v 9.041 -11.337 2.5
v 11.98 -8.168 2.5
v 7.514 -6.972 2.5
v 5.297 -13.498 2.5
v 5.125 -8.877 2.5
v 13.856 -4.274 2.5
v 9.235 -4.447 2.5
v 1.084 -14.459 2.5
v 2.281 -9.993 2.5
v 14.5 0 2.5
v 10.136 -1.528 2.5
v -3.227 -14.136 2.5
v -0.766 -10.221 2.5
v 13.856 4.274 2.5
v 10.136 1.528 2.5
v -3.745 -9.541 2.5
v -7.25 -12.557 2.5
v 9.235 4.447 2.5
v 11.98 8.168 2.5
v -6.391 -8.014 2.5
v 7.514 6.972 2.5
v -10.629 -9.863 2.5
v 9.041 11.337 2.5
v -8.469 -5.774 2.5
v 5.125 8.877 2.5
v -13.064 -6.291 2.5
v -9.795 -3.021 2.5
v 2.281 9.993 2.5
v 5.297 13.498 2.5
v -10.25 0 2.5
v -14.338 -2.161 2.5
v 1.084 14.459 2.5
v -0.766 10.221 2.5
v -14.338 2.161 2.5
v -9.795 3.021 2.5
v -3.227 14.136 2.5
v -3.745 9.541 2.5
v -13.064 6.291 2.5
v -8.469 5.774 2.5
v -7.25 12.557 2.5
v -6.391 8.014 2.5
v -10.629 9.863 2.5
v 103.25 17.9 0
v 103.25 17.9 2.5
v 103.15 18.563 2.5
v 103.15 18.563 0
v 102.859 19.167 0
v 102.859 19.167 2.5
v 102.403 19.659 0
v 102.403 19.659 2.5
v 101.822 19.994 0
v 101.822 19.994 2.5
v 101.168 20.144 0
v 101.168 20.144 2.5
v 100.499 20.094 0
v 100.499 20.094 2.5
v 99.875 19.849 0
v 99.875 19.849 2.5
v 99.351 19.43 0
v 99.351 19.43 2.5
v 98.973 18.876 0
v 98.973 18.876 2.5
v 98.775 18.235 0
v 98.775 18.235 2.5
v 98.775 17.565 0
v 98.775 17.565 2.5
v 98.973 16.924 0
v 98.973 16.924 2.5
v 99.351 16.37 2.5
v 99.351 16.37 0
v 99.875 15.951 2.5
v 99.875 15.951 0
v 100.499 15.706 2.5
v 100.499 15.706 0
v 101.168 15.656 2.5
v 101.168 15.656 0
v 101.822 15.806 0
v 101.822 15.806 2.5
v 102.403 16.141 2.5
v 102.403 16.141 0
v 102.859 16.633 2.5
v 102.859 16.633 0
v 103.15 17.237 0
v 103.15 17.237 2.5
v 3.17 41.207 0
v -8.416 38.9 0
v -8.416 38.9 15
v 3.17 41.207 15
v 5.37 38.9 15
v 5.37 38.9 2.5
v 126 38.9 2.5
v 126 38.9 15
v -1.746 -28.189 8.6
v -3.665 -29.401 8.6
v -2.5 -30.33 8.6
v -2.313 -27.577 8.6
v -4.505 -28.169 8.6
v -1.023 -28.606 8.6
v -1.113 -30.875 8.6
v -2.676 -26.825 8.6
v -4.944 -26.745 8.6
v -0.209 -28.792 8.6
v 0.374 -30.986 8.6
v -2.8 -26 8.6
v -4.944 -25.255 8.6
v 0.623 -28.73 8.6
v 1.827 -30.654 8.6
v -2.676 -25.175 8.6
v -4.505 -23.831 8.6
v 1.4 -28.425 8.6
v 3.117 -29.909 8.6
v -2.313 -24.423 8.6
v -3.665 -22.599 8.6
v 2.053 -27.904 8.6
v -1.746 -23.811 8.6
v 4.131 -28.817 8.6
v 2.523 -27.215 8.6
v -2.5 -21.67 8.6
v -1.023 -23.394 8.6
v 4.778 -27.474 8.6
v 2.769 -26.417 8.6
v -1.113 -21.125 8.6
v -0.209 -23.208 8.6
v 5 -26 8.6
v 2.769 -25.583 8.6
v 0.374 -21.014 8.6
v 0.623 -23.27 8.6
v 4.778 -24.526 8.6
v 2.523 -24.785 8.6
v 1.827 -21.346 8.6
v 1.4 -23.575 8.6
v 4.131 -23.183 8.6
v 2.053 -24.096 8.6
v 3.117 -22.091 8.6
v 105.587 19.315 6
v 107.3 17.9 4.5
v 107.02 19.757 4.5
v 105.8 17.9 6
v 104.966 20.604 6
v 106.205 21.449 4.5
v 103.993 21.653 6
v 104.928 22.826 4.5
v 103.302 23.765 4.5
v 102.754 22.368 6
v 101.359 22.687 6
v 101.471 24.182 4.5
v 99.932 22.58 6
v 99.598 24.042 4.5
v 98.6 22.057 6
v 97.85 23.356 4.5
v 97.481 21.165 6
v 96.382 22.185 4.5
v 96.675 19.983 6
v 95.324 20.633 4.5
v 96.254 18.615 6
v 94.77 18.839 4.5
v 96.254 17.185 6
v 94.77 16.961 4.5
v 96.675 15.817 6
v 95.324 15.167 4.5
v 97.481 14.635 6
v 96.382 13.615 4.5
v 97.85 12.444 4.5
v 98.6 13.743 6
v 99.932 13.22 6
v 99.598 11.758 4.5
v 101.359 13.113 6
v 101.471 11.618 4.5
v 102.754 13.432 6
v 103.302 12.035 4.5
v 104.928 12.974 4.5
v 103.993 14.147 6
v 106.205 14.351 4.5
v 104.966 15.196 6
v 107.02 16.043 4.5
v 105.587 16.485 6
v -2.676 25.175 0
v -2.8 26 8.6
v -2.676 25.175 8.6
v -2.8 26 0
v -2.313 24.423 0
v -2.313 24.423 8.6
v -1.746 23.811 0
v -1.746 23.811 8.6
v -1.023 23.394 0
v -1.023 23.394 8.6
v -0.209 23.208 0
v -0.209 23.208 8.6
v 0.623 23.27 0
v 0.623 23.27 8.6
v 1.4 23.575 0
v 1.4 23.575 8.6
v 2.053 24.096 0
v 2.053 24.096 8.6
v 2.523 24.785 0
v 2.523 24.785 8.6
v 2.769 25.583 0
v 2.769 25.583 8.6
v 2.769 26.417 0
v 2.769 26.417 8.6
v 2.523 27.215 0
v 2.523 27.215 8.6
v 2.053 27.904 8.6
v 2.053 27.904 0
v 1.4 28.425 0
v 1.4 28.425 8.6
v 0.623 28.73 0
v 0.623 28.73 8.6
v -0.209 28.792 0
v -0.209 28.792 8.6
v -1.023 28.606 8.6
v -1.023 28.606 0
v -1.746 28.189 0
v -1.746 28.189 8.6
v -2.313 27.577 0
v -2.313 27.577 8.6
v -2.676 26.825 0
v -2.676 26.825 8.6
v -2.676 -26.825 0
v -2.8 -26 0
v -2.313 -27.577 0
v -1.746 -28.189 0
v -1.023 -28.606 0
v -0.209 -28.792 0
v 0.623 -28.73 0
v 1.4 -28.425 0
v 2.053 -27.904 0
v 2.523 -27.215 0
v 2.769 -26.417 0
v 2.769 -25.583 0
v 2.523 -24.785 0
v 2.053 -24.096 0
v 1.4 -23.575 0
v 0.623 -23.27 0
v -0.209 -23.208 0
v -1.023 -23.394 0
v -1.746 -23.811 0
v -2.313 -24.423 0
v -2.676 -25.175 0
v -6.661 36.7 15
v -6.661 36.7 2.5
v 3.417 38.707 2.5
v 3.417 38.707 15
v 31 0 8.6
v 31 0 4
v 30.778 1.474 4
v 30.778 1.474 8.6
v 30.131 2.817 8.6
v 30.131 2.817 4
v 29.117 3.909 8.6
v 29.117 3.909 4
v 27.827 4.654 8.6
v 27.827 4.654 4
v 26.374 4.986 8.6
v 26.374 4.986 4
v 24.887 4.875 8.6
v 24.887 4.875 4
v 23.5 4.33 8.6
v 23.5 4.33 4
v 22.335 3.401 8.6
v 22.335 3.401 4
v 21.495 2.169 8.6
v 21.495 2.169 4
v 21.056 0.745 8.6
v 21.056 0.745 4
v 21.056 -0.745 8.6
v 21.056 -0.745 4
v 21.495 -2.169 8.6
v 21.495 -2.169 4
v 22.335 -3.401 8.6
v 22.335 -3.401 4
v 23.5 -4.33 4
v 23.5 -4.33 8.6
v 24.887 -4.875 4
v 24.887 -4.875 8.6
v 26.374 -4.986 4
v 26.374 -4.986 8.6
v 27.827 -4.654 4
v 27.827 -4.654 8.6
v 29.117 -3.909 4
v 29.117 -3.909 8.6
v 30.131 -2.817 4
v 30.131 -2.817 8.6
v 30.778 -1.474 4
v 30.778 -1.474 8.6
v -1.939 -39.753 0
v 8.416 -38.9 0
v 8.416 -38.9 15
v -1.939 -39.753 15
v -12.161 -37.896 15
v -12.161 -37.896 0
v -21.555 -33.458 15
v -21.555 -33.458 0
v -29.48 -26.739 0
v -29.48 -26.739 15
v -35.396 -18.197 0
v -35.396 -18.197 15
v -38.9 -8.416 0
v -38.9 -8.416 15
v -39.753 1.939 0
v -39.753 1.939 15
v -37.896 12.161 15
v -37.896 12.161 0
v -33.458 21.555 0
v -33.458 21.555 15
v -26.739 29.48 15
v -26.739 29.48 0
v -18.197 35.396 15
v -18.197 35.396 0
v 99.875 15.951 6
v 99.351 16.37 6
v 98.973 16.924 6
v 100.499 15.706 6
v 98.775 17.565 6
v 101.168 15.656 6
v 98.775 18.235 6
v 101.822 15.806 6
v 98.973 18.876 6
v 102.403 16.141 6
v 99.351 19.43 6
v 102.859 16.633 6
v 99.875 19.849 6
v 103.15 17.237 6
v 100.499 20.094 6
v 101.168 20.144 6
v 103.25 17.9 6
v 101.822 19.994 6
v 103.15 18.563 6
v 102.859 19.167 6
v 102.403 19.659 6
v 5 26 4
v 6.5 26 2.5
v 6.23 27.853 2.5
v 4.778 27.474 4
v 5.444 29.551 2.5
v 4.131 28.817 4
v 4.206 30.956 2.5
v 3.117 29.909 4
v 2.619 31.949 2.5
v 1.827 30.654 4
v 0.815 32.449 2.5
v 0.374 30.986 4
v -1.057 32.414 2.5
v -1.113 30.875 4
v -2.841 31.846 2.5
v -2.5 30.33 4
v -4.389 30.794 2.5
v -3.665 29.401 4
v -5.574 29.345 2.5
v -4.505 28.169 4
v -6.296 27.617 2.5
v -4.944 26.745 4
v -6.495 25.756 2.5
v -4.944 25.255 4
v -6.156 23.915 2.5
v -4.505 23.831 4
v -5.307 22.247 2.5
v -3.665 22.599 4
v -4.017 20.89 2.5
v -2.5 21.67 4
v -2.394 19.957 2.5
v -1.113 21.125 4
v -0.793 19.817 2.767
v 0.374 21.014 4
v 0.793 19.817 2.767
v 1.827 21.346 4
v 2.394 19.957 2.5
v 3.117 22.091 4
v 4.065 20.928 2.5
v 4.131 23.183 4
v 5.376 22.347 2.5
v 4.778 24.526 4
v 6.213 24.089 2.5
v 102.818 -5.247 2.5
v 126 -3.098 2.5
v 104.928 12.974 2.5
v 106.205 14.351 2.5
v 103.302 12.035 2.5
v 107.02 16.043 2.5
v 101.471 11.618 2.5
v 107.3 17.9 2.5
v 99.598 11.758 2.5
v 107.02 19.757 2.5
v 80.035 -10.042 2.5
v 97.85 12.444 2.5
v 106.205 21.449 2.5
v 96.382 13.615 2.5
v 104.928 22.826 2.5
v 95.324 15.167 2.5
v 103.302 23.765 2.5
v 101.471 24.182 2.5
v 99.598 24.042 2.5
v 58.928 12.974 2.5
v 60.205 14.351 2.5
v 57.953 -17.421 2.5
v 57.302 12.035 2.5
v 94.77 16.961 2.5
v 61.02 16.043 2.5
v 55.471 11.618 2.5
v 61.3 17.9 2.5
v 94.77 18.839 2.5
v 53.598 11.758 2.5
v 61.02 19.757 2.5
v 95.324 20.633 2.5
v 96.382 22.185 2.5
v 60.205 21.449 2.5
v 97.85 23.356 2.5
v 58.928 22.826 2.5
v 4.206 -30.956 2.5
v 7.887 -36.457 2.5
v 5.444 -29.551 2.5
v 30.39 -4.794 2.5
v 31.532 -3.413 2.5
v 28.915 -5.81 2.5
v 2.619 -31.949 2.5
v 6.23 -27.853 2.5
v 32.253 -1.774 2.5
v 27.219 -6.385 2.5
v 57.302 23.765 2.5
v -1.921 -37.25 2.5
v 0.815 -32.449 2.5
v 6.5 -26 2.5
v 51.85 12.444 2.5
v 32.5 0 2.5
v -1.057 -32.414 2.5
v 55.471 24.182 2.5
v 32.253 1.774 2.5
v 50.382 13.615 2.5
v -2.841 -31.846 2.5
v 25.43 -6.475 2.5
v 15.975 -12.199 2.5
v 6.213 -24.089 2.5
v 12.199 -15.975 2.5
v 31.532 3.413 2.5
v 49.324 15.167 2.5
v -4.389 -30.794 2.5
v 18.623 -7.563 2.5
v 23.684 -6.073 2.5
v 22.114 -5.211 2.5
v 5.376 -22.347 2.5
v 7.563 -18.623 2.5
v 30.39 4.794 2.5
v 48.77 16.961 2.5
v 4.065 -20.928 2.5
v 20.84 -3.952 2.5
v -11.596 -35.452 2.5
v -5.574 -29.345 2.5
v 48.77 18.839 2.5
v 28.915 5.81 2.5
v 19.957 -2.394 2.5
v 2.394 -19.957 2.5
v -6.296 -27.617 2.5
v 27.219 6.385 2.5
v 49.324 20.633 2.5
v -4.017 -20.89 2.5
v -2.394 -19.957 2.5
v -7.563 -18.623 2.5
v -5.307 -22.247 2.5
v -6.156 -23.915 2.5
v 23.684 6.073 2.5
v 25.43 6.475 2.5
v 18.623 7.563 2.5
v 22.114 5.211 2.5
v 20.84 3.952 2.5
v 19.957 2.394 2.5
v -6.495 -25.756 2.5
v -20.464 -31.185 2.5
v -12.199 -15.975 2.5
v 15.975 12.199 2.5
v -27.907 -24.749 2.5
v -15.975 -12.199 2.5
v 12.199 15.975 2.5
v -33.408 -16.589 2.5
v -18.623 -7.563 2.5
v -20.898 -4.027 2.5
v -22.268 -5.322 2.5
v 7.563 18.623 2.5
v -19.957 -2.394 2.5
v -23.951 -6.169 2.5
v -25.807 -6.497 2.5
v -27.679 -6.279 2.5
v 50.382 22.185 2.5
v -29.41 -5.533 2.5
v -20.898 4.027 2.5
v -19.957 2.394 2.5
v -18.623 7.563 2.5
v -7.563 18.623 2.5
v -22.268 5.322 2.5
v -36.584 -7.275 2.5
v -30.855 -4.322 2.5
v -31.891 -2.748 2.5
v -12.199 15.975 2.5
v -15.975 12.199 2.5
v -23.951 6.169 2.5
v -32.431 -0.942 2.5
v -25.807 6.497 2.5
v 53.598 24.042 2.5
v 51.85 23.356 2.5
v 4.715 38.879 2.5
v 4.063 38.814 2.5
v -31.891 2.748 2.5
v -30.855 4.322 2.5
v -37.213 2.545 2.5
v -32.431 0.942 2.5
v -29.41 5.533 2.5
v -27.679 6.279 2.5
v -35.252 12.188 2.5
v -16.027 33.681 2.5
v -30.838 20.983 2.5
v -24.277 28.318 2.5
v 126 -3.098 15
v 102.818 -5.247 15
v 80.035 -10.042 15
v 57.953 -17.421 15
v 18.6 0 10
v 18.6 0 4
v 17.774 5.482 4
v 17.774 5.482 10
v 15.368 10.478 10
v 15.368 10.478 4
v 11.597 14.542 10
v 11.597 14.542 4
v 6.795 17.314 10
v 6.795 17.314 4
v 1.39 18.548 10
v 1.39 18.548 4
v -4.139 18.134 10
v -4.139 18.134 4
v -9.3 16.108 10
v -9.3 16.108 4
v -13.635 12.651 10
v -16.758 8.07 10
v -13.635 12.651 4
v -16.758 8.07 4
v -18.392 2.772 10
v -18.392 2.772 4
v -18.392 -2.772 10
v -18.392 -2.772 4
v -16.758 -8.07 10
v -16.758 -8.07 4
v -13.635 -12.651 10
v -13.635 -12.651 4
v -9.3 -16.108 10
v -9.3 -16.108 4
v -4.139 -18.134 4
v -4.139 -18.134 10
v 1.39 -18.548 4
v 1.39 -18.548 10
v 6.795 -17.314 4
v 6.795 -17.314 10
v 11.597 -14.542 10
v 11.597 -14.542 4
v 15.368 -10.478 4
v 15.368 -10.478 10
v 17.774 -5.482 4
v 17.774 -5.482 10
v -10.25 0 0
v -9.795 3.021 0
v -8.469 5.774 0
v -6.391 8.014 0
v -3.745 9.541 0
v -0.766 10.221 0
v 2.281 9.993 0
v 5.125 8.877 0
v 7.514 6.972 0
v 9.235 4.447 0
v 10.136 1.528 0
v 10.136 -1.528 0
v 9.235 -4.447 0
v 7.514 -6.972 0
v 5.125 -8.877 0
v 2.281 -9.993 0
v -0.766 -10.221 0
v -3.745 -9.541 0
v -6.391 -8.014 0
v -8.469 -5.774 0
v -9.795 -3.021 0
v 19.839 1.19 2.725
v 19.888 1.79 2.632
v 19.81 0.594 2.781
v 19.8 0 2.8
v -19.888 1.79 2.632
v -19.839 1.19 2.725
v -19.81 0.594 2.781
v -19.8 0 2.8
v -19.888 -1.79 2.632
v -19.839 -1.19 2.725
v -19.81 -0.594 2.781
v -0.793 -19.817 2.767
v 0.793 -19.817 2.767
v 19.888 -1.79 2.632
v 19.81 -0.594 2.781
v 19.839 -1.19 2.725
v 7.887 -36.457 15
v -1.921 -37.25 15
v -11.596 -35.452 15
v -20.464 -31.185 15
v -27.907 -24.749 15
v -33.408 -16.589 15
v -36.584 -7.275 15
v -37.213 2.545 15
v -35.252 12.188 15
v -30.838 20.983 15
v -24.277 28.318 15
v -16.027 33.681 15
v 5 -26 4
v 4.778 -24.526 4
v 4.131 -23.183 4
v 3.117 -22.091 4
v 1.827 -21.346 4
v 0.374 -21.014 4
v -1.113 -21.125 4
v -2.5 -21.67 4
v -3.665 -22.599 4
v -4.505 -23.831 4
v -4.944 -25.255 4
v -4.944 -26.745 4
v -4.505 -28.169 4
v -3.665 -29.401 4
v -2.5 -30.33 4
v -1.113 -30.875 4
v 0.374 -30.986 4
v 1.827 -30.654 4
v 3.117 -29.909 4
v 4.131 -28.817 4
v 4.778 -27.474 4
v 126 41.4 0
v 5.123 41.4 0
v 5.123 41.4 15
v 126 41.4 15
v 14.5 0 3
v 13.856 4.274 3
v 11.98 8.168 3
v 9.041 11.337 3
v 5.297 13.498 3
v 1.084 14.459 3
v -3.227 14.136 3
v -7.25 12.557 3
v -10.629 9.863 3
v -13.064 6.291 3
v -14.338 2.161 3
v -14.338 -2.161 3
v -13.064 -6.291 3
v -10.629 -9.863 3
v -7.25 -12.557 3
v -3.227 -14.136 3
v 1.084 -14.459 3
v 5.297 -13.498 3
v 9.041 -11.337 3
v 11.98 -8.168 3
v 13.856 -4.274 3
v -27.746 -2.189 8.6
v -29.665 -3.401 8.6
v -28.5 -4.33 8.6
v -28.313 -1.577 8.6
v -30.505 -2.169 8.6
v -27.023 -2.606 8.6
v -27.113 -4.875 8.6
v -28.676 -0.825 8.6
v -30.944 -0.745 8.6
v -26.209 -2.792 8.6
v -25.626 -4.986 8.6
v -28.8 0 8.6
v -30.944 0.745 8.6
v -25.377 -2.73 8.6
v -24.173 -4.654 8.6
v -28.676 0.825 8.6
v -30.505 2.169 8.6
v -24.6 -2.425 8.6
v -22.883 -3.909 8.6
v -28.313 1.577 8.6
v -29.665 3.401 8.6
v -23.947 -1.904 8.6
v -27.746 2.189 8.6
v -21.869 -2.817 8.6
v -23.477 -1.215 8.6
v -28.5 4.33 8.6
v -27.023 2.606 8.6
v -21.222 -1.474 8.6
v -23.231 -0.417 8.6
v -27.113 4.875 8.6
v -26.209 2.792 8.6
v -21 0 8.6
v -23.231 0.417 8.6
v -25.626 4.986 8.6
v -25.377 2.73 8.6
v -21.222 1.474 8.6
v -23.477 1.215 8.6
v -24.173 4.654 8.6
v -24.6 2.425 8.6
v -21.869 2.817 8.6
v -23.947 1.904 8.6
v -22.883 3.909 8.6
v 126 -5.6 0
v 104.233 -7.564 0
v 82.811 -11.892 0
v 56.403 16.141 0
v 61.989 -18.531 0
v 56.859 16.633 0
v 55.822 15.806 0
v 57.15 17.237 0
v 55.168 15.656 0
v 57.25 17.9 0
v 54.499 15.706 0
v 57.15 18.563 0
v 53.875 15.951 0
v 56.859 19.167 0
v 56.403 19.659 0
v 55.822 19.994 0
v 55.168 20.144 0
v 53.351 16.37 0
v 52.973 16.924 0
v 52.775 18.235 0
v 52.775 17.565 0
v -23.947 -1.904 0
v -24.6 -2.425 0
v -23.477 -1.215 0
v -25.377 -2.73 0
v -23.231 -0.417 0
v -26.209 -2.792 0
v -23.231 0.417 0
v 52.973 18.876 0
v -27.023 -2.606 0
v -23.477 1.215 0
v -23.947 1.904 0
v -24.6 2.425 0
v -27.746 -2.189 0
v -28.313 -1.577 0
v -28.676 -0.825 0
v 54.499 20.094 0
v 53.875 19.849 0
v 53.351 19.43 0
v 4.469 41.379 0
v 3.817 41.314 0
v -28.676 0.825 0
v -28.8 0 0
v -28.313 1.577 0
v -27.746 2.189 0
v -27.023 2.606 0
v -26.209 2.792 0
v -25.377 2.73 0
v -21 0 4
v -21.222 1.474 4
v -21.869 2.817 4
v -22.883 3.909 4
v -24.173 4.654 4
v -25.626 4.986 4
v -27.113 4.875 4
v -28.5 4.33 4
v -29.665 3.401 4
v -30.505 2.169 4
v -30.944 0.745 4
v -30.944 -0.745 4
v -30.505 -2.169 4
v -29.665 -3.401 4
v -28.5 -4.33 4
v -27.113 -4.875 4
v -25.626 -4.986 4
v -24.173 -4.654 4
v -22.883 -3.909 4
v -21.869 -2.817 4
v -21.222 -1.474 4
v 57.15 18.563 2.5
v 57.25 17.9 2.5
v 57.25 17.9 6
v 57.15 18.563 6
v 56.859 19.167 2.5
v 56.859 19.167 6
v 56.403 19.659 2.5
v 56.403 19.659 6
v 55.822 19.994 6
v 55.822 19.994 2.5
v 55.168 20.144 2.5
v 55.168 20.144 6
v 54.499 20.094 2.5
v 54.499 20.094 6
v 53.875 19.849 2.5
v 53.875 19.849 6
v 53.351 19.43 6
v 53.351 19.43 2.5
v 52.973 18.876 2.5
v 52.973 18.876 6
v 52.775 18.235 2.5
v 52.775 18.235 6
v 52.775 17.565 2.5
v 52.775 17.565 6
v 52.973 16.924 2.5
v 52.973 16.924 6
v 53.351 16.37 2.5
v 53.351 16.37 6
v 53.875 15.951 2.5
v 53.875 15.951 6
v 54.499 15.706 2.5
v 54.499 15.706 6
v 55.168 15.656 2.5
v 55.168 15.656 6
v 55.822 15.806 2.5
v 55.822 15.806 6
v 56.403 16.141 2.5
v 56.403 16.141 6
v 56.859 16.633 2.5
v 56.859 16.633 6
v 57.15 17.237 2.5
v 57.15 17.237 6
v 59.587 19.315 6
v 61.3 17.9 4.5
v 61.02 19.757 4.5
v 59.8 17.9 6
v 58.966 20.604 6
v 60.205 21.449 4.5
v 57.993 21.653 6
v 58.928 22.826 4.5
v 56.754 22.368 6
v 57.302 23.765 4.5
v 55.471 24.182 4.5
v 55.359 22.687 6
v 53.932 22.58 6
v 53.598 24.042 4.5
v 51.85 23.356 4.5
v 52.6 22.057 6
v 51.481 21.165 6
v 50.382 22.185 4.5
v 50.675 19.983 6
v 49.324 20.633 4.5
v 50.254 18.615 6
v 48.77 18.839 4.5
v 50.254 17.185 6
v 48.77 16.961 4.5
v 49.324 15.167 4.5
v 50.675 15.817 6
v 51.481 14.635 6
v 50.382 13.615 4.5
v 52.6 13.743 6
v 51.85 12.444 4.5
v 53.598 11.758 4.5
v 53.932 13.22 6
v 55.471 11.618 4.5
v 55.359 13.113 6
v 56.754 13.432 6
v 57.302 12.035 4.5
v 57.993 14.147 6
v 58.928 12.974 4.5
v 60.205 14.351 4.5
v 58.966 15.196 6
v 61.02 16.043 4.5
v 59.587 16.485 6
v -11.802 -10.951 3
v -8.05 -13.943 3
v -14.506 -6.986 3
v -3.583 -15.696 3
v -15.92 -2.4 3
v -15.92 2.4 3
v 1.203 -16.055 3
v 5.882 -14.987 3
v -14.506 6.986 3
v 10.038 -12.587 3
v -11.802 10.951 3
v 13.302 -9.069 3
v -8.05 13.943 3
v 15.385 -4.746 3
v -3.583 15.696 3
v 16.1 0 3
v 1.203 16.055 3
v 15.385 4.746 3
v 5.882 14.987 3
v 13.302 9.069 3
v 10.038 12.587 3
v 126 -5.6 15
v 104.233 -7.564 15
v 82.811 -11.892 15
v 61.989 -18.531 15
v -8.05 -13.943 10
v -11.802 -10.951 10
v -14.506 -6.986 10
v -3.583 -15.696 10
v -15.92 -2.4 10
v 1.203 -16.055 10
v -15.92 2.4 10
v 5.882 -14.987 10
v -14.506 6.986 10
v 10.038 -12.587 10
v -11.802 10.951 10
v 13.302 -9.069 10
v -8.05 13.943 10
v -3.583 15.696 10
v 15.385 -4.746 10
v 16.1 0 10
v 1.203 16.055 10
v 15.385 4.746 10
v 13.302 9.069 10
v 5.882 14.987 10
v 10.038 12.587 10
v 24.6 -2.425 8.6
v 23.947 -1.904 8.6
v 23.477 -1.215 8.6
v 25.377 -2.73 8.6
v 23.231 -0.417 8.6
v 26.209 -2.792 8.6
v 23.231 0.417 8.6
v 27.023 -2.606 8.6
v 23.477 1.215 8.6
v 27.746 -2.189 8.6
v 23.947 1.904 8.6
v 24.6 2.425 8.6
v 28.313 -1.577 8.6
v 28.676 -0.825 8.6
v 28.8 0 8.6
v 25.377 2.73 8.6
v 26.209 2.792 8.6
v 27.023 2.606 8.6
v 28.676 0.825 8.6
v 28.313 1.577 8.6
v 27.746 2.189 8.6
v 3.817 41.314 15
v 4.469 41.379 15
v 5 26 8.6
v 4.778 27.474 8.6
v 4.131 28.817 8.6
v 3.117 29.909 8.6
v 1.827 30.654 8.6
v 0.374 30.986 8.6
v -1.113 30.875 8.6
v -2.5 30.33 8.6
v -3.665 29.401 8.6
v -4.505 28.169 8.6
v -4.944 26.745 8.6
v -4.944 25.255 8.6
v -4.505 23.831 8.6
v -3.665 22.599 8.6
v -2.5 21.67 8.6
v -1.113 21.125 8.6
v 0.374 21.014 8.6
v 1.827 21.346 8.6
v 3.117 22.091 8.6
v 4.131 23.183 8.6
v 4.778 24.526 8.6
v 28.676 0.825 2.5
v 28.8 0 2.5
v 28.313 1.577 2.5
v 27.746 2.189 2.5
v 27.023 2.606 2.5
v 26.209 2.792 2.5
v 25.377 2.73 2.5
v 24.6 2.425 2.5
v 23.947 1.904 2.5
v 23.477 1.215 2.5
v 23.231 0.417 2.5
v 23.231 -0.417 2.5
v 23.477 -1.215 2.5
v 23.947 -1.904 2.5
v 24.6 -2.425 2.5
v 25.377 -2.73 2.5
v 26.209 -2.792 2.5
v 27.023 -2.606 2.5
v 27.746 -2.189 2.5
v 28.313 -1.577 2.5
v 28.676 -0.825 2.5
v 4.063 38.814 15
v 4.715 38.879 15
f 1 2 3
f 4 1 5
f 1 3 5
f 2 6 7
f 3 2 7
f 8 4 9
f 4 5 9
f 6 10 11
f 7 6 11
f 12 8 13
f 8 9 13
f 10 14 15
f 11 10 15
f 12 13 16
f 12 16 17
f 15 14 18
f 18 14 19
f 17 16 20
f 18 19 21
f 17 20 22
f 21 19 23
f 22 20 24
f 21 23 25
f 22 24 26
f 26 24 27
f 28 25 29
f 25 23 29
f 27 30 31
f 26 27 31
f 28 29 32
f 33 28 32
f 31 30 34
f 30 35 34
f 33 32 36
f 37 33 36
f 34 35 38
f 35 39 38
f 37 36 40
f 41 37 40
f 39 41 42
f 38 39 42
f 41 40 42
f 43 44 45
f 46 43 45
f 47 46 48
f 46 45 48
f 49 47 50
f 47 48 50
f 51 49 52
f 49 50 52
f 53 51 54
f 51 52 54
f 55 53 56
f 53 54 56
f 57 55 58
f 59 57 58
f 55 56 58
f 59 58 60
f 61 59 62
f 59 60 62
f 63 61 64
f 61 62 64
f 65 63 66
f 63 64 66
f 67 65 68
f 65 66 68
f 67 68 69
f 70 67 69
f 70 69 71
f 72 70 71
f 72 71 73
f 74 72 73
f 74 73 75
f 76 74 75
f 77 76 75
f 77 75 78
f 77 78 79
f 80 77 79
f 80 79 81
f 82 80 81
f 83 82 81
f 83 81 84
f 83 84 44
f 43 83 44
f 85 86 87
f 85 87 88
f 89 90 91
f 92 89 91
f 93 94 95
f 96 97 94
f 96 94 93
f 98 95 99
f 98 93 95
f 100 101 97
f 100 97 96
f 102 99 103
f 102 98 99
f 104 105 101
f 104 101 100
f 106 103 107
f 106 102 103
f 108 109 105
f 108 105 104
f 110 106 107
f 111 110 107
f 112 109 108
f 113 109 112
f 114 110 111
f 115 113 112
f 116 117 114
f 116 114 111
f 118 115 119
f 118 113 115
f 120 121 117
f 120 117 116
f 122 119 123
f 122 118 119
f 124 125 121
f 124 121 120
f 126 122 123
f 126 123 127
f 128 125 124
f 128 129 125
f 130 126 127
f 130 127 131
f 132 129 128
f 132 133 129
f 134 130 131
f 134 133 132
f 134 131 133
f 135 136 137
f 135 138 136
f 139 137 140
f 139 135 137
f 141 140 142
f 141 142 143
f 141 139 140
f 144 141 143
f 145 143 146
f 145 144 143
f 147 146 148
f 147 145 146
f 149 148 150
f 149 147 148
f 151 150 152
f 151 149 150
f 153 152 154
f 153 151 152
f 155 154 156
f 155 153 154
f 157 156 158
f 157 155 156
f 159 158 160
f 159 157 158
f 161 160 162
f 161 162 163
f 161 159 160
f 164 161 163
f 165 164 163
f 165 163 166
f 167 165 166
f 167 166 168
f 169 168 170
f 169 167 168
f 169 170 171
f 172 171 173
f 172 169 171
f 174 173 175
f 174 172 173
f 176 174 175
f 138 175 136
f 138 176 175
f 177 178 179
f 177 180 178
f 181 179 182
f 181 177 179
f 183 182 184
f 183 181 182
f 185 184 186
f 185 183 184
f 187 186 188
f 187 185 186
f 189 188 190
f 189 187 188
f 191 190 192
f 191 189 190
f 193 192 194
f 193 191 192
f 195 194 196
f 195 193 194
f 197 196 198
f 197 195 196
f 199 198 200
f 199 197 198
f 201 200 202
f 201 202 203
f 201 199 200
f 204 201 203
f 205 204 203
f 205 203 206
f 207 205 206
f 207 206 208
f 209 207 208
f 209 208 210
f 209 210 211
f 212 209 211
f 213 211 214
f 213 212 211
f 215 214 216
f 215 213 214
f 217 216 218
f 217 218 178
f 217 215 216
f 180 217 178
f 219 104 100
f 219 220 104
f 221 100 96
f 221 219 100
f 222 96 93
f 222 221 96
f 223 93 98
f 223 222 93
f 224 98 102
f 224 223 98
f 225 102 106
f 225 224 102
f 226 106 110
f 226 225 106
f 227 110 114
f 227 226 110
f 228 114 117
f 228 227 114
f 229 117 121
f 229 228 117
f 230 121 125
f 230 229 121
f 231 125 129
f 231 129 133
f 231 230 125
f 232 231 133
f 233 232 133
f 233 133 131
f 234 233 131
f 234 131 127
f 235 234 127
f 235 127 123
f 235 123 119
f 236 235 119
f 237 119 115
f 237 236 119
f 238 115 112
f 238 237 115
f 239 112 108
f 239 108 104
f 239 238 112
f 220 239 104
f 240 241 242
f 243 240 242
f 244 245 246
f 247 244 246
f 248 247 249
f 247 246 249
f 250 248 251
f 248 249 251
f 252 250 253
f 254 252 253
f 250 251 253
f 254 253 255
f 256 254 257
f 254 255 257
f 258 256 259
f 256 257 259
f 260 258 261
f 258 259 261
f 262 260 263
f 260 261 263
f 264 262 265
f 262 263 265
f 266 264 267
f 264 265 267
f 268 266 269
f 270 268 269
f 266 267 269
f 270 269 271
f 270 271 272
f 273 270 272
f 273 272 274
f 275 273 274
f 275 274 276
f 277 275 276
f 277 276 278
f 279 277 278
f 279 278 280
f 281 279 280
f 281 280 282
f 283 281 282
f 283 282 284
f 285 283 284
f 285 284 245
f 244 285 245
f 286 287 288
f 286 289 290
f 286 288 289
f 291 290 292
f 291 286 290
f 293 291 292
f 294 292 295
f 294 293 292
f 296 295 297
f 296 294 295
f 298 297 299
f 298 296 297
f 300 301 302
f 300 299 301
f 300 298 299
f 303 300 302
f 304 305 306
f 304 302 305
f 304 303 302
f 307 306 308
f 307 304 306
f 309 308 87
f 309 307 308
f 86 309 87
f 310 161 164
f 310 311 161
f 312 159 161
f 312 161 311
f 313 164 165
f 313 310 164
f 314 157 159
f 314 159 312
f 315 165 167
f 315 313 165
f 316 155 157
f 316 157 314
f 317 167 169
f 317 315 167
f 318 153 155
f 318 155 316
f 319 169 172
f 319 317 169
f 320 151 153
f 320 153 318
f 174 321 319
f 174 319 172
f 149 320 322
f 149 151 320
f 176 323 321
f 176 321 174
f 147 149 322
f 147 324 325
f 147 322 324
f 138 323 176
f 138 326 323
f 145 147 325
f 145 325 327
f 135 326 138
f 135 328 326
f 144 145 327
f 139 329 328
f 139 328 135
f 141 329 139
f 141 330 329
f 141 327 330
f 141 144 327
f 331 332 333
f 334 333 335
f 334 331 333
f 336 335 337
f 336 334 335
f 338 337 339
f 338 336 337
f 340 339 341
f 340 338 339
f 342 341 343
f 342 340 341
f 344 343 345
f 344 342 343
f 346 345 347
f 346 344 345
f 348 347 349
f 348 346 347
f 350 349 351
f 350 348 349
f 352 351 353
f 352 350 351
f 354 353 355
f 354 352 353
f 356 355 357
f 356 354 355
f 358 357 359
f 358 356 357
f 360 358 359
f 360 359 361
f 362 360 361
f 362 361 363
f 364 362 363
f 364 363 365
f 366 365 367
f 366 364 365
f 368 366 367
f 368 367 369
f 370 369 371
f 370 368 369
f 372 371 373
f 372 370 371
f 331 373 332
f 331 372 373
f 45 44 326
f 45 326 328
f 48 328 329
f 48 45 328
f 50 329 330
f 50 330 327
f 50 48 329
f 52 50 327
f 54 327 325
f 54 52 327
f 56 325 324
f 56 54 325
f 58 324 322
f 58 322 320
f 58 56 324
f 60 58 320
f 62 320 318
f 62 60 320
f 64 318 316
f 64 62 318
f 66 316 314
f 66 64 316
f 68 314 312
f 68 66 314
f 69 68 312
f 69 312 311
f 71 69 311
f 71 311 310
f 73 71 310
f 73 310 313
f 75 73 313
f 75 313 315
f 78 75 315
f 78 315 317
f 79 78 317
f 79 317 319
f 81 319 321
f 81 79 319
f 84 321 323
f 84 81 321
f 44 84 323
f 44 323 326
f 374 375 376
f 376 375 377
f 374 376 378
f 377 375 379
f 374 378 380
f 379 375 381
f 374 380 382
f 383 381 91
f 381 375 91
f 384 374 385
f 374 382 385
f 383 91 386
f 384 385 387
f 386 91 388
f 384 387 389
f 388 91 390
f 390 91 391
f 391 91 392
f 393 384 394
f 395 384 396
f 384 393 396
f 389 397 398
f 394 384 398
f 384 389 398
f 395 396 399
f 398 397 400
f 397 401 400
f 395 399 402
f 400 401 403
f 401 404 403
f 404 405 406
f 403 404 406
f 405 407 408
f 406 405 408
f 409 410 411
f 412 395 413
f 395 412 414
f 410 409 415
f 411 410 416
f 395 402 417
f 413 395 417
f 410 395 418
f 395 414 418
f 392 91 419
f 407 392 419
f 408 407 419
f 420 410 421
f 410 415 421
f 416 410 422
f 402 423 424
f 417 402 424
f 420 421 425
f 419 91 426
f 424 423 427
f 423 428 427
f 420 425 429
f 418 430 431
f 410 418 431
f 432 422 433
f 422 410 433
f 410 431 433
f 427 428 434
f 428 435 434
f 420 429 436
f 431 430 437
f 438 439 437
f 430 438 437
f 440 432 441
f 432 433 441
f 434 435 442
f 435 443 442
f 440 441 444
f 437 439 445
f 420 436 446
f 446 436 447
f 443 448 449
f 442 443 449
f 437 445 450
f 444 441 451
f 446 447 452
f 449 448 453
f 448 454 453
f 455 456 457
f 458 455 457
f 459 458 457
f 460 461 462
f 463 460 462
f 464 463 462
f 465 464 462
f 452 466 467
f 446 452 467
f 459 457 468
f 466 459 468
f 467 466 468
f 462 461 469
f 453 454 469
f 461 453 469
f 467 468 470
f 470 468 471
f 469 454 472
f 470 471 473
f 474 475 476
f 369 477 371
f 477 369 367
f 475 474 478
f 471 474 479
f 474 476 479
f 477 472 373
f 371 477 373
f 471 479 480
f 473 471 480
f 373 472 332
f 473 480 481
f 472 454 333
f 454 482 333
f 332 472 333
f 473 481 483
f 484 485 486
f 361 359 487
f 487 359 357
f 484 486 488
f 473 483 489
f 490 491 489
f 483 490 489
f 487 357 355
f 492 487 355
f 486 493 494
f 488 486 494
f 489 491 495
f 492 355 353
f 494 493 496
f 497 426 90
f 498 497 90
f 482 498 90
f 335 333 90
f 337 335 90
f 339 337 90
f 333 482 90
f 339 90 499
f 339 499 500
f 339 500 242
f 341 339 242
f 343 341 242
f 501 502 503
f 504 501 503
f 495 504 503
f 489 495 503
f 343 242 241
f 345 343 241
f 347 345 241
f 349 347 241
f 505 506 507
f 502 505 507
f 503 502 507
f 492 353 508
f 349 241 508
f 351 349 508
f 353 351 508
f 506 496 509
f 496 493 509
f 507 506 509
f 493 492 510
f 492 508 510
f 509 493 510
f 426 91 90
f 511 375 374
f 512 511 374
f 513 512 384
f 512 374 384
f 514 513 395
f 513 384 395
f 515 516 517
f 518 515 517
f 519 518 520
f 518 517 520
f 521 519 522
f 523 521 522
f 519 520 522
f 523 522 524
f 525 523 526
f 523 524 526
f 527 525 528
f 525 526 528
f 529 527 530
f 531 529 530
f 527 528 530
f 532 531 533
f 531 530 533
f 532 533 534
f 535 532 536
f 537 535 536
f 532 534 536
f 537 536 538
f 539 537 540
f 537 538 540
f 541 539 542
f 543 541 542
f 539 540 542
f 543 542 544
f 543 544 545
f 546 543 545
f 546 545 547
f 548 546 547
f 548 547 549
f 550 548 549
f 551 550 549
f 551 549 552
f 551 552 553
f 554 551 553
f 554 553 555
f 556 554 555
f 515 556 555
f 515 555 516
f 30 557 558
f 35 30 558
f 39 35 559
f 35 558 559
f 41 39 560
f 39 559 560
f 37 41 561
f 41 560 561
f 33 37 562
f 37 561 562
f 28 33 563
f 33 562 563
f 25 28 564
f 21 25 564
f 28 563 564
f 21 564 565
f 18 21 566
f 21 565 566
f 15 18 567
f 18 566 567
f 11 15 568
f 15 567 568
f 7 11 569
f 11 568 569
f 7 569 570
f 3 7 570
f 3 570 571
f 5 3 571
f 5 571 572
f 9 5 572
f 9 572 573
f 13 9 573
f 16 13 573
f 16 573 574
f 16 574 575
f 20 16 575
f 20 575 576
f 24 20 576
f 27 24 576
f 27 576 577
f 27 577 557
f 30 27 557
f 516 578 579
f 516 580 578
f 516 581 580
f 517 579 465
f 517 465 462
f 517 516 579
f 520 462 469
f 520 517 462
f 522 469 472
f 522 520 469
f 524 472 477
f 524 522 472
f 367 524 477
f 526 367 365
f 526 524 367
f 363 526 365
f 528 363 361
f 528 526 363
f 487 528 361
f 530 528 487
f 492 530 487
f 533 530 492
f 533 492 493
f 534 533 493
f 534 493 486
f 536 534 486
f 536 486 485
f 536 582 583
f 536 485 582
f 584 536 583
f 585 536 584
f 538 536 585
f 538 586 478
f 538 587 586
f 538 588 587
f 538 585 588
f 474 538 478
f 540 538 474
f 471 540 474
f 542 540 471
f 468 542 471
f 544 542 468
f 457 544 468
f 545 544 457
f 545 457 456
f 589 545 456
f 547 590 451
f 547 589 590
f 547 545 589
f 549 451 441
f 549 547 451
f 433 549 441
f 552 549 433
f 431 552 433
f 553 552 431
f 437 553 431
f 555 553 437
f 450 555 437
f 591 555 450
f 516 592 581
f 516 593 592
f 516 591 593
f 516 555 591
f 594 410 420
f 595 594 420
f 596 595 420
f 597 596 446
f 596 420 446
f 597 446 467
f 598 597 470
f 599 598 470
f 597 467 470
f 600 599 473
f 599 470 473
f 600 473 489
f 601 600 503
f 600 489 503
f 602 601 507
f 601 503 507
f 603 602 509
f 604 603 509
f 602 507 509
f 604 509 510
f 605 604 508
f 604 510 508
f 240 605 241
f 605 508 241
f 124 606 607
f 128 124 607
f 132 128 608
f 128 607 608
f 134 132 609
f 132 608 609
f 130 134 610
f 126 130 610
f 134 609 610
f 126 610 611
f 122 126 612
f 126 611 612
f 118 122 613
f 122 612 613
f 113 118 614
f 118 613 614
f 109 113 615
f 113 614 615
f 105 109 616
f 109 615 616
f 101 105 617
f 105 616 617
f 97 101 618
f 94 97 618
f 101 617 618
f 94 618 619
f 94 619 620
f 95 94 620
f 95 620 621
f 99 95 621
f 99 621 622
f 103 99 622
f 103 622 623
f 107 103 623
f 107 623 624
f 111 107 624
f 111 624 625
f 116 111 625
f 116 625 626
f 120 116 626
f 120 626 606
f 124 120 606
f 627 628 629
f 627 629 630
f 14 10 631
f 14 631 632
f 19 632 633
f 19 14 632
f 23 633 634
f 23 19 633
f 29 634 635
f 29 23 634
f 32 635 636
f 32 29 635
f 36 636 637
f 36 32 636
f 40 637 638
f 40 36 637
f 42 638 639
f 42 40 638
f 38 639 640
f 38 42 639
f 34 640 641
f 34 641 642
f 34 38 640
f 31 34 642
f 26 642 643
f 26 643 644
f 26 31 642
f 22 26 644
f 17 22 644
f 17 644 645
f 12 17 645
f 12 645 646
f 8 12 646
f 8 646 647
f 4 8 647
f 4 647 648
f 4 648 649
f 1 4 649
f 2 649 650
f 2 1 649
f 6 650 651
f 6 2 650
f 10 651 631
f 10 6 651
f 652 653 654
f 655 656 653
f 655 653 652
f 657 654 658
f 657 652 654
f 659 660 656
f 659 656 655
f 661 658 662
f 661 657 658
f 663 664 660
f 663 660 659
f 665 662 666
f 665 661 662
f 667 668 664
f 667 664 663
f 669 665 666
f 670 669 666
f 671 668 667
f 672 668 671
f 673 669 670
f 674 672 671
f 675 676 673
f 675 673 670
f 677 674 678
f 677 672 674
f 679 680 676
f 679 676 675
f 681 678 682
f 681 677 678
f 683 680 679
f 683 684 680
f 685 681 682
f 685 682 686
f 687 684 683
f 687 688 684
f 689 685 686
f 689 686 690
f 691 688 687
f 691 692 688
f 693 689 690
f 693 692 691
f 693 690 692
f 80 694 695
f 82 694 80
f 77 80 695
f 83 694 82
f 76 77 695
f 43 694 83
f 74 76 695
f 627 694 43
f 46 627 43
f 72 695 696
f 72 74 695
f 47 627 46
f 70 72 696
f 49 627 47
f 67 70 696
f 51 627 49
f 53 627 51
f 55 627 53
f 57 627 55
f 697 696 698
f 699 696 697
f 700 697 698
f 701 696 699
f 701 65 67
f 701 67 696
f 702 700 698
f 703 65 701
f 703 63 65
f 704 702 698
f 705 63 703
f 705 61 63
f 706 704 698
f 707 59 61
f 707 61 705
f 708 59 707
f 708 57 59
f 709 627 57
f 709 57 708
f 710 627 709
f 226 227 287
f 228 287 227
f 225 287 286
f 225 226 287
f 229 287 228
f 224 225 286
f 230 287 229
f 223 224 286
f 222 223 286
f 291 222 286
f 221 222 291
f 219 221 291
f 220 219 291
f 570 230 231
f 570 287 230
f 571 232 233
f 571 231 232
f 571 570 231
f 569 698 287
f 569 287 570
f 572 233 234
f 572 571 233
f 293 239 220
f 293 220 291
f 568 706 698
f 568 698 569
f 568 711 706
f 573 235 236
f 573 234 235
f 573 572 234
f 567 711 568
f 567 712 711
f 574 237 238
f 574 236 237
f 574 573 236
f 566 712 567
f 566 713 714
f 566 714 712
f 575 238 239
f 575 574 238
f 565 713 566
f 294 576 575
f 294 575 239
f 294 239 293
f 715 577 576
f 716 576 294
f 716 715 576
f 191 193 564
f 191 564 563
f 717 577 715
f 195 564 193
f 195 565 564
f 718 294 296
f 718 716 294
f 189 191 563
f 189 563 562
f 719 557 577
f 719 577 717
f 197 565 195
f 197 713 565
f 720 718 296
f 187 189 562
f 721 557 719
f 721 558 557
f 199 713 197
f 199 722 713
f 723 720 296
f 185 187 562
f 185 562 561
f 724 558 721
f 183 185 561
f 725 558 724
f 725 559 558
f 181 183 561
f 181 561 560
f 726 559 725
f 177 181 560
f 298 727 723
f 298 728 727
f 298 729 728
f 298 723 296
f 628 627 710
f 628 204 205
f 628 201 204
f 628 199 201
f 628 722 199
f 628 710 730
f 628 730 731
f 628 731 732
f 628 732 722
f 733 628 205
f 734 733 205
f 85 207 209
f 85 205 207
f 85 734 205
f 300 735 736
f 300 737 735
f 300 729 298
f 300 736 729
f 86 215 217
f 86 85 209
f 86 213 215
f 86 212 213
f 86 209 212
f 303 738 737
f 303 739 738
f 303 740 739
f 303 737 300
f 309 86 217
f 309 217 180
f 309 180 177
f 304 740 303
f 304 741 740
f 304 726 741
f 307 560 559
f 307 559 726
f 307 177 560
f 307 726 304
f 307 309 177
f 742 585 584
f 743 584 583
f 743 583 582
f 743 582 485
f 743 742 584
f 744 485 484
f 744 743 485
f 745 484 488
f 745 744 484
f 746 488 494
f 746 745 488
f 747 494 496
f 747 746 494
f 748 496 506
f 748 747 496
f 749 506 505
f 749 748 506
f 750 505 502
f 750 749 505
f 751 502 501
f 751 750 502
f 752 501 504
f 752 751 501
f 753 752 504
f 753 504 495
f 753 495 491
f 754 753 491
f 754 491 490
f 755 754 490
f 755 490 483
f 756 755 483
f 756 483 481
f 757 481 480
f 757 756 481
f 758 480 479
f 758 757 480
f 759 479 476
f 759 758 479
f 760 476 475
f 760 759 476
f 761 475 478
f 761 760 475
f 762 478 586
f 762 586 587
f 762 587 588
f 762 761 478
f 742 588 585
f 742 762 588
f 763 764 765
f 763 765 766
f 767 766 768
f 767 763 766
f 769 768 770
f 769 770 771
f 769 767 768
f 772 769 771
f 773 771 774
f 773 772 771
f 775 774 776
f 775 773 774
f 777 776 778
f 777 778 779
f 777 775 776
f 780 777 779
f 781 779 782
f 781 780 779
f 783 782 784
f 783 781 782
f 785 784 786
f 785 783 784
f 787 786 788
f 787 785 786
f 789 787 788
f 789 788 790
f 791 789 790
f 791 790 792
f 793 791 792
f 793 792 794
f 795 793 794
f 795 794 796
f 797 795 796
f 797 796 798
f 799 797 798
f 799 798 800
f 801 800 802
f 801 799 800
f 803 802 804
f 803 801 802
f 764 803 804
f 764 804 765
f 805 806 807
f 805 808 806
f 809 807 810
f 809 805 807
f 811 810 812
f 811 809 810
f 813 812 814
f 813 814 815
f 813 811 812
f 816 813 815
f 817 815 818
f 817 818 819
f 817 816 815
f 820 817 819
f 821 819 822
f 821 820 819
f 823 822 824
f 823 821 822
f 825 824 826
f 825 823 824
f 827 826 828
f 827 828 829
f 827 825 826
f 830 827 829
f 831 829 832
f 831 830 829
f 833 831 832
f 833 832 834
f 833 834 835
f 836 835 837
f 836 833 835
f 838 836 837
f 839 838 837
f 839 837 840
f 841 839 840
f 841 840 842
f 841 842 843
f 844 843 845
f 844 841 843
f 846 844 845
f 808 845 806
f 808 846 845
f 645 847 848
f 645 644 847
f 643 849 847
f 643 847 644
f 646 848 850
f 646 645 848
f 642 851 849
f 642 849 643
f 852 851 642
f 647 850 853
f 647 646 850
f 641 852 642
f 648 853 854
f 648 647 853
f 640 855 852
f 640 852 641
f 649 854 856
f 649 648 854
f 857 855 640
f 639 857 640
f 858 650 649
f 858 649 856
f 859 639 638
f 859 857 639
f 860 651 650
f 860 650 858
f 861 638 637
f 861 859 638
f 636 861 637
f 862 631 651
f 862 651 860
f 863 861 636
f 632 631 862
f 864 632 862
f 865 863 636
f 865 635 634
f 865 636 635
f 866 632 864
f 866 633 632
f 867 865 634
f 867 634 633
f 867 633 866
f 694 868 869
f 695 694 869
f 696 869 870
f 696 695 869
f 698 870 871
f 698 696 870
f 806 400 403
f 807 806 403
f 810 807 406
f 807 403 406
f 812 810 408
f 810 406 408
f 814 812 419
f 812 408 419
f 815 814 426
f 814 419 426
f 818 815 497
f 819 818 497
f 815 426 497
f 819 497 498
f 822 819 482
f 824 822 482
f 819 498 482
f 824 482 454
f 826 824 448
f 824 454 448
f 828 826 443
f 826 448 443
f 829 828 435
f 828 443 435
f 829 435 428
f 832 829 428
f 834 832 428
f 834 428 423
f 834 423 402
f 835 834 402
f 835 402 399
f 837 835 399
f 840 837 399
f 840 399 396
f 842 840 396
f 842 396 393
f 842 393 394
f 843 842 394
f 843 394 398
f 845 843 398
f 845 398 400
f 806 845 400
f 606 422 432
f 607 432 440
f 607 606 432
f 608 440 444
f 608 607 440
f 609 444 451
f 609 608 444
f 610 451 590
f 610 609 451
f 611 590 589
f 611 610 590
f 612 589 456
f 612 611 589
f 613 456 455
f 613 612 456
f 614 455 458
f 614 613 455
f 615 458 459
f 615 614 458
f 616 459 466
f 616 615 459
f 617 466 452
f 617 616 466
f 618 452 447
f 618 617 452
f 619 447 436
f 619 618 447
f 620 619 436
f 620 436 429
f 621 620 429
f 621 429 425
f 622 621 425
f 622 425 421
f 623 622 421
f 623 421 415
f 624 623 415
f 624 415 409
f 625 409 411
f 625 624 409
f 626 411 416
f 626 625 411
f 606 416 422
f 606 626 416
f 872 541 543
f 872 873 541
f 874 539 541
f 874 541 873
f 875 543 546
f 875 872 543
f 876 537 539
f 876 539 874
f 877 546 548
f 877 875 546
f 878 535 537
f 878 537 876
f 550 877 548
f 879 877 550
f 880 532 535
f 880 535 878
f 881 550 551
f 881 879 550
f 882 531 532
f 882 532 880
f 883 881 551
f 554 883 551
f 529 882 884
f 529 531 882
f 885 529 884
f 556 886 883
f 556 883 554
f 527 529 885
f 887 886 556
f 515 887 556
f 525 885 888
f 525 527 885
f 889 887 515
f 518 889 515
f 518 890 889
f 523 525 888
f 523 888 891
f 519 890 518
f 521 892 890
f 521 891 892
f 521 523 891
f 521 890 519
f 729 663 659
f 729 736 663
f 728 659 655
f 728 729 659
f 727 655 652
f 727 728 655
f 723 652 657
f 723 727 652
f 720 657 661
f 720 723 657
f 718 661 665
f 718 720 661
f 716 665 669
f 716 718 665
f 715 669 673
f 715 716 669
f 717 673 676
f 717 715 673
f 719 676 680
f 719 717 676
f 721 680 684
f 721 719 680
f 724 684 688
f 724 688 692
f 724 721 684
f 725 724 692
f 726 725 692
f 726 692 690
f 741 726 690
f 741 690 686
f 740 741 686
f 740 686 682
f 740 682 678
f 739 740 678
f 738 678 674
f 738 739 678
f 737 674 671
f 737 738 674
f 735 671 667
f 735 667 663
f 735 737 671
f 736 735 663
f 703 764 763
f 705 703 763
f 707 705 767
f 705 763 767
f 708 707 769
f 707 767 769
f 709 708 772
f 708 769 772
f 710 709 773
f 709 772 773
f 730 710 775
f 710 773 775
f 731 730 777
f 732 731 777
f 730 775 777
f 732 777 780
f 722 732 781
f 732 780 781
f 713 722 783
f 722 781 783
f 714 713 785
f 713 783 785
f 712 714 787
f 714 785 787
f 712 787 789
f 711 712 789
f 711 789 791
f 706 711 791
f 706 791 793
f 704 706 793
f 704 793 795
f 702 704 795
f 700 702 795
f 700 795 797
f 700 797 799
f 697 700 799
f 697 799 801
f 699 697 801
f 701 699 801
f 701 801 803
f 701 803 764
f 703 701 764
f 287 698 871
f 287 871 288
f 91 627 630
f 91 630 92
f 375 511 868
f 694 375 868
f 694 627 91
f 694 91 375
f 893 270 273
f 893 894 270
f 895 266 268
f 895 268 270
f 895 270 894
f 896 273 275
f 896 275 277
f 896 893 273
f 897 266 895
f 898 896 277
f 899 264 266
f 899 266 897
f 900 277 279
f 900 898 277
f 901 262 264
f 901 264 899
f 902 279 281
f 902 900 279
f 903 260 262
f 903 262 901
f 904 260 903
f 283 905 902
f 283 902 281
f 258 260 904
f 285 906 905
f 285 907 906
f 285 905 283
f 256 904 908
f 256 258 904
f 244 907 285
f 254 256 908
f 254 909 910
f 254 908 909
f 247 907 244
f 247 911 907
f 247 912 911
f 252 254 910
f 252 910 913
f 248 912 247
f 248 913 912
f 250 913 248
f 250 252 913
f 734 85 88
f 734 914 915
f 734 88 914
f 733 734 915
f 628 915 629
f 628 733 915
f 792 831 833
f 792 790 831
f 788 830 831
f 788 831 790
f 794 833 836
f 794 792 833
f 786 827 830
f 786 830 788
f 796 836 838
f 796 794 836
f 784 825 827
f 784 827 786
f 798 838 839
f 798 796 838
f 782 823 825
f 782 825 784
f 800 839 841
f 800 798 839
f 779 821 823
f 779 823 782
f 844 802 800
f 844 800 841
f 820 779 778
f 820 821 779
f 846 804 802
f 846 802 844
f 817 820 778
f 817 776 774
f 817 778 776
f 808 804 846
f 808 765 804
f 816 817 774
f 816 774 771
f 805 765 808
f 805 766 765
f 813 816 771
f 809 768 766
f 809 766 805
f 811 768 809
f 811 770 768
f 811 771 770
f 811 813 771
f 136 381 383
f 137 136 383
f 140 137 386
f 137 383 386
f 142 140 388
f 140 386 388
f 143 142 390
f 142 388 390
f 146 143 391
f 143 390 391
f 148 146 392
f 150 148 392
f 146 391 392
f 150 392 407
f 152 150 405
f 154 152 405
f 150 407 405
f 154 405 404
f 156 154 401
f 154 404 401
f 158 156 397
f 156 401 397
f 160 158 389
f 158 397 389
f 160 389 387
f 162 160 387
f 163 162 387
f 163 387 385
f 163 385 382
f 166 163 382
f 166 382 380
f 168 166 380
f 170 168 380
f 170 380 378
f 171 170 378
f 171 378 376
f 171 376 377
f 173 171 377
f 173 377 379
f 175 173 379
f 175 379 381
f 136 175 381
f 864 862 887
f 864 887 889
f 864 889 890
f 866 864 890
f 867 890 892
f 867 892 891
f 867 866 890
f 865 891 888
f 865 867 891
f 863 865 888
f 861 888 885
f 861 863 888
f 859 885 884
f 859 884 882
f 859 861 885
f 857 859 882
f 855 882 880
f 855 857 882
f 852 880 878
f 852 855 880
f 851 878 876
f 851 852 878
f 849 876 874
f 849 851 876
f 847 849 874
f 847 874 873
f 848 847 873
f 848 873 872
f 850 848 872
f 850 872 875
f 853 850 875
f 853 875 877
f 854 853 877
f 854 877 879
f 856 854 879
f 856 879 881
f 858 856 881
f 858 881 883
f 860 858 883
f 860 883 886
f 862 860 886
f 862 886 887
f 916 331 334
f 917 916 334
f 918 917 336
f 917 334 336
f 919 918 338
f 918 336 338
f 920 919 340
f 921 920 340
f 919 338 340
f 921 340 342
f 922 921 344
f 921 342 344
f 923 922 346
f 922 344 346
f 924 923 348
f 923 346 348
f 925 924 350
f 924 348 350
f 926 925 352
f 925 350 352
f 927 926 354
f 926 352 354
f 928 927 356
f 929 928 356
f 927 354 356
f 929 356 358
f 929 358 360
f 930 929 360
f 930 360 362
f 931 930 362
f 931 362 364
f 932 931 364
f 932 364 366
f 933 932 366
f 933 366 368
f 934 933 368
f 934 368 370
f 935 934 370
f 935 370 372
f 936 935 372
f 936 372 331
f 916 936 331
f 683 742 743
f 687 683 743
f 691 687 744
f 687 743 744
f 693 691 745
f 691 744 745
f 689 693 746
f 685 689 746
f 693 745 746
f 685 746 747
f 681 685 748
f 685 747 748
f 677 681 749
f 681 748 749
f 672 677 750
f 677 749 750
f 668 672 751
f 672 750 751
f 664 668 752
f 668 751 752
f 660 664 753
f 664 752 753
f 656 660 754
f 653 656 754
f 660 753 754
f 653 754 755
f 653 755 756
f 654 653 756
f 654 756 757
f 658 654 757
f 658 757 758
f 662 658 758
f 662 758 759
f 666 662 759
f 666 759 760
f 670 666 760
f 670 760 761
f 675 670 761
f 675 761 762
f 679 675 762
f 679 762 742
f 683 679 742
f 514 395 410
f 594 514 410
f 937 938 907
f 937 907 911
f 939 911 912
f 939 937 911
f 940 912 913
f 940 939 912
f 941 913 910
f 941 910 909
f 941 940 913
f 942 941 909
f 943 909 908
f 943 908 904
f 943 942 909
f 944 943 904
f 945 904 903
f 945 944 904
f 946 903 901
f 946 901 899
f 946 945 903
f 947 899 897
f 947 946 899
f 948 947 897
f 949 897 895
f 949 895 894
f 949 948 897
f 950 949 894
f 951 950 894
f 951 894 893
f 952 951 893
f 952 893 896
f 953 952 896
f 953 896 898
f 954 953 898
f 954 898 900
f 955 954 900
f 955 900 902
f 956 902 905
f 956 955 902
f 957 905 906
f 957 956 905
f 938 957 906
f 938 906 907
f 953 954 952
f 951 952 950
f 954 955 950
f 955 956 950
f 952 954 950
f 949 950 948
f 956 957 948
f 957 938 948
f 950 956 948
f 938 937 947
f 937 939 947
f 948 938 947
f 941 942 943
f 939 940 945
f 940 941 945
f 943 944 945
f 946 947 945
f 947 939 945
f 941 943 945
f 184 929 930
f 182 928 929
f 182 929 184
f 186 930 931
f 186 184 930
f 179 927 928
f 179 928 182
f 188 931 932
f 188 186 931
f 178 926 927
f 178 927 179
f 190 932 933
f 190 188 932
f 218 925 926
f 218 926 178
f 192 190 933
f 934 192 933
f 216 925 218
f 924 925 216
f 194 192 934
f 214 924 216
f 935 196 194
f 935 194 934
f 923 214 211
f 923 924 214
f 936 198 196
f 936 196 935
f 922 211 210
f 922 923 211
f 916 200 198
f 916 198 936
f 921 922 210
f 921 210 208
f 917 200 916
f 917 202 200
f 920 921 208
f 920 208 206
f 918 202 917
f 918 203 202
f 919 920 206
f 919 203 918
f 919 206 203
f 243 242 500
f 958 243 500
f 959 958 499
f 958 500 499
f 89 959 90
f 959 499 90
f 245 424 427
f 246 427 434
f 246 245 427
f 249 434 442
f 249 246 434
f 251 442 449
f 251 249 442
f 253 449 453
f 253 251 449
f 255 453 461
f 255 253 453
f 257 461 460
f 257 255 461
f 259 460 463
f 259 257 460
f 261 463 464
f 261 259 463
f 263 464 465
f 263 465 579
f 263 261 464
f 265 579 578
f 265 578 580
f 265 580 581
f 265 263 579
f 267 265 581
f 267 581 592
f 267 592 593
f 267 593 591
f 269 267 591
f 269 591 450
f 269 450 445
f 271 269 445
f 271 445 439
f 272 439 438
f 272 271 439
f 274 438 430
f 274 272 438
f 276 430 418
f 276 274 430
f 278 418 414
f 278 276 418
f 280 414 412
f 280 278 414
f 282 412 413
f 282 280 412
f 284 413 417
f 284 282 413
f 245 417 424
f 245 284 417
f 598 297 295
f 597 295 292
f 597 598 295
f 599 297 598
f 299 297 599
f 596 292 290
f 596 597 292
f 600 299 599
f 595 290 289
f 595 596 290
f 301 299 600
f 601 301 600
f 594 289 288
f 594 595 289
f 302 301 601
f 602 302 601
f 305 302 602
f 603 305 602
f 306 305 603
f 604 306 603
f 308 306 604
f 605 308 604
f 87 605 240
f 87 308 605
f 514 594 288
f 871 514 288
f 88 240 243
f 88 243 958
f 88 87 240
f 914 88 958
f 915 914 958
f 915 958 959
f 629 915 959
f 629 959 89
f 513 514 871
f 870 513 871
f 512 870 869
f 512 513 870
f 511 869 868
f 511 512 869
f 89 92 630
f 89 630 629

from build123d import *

# Parameters (mm, degrees)
ESTRUSIONE_ESTRUSIONE1_DEPTH = 2.5
ESTRUSIONE_ESTRUSIONE2_DEPTH = 15
SCHIZZO2_R                   = 10.25
SCHIZZO2_R_2                 = 2.8
TAGLIO_ESTRUSIONE1_DEPTH     = 15
SCHIZZO3_R                   = 16.1
SCHIZZO3_R_2                 = 14.5
ESTRUSIONE_ESTRUSIONE3_DEPTH = 0.5
SCHIZZO3_3_R                 = 18.6
SCHIZZO3_3_R_2               = 16.1
ESTRUSIONE_ESTRUSIONE4_DEPTH = 7.5
SCHIZZO3_4_R                 = 5
SCHIZZO3_4_R_2               = 2.8
ESTRUSIONE_ESTRUSIONE5_DEPTH = 6.1
SCHIZZO3_5_R                 = 6.3
SCHIZZO3_5_R_2               = 2.25
ESTRUSIONE_ESTRUSIONE6_DEPTH = 3.5
SMUSSO1_SIZE                 = 1.5
FORO_PER_VITE_M4_1_D         = 4.5
FORO_PER_VITE_M4_1_DEPTH     = 50
FORO_PER_VITE_M4_1_TIP       = 1.351936393


with BuildPart() as part:
    # Schizzo1 → Estrusione-Estrusione1 (new body)
    with BuildSketch(Plane.XY):
        with BuildLine():
            Line((5.123487201, 41.4), (126, 41.4))
            Line((126, 41.4), (126, -5.6))
            ThreePointArc((126, -5.6), (93.463092461, -9.435358059), (61.98889523, -18.531249019))
            Line((61.98889523, -18.531249019), (8.416056083, -38.9))
            ThreePointArc((8.416056083, -38.9), (-38.9, -8.416056083), (-8.416056083, 38.9))
            Line((-8.416056083, 38.9), (3.170362201, 41.207410603))
            ThreePointArc((3.170362201, 41.207410603), (4.142188579, 41.351736181), (5.123487201, 41.4))
        make_face()
    extrude(amount=ESTRUSIONE_ESTRUSIONE1_DEPTH)

    # Schizzo1<3> → Estrusione-Estrusione2 (add)
    with BuildSketch(Plane.XY):
        with BuildLine():
            Line((126, 41.4), (5.123487201, 41.4))
            ThreePointArc((5.123487201, 41.4), (4.142188579, 41.351736181), (3.170362201, 41.207410603))
            Line((3.170362201, 41.207410603), (-8.416056083, 38.9))
            ThreePointArc((-8.416056083, 38.9), (-38.9, -8.416056083), (8.416056083, -38.9))
            Line((8.416056083, -38.9), (61.98889523, -18.531249019))
            ThreePointArc((61.98889523, -18.531249019), (93.463092461, -9.435358059), (126, -5.6))
            Line((126, -5.6), (126, -3.098457484))
            ThreePointArc((126, -3.098457484), (91.357291517, -7.317073844), (57.953366675, -17.421121553))
            Line((57.953366675, -17.421121553), (7.887409345, -36.456532663))
            ThreePointArc((7.887409345, -36.456532663), (-36.58362067, -7.275211244), (-6.660968885, 36.700429065))
            Line((-6.660968885, 36.700429065), (3.41687663, 38.707410603))
            ThreePointArc((3.41687663, 38.707410603), (4.388703008, 38.851736181), (5.37000163, 38.9))
            Line((5.37000163, 38.9), (126, 38.9))
            Line((126, 38.9), (126, 41.4))
        make_face()
    extrude(amount=ESTRUSIONE_ESTRUSIONE2_DEPTH)

    # Schizzo2 → Taglio-Estrusione1 (cut)
    with BuildSketch(Plane(origin=(0, 0, 0), x_dir=(-1, 0, 0), z_dir=(0, 0, -1))):
        Circle(SCHIZZO2_R)
        with Locations((0, -26)):
            Circle(SCHIZZO2_R_2)
        with Locations((26, 0)):
            Circle(SCHIZZO2_R_2)
        with Locations((0, 26)):
            Circle(SCHIZZO2_R_2)
    extrude(amount=-TAGLIO_ESTRUSIONE1_DEPTH, mode=Mode.SUBTRACT)

    # Schizzo3 → Estrusione-Estrusione3 (add)
    with BuildSketch(Plane.XY.offset(2.5)):
        Circle(SCHIZZO3_R)
        Circle(SCHIZZO3_R_2, mode=Mode.SUBTRACT)
    extrude(amount=ESTRUSIONE_ESTRUSIONE3_DEPTH)

    # Schizzo3<3> → Estrusione-Estrusione4 (add)
    with BuildSketch(Plane.XY.offset(2.5)):
        Circle(SCHIZZO3_3_R)
        Circle(SCHIZZO3_3_R_2, mode=Mode.SUBTRACT)
    extrude(amount=ESTRUSIONE_ESTRUSIONE4_DEPTH)

    # Schizzo3<4> → Estrusione-Estrusione5 (add)
    # profile 1 of 4: a face of its own
    with BuildSketch(Plane.XY.offset(2.5)):
        with Locations((-26, 0)):
            Circle(SCHIZZO3_4_R)
        with Locations(Location((-26, 0, 0), (0, 0, 180))):
            Circle(SCHIZZO3_4_R_2, mode=Mode.SUBTRACT)
    # profile 2 of 4: a face of its own
    with BuildSketch(Plane.XY.offset(2.5)):
        with Locations((0, -26)):
            Circle(SCHIZZO3_4_R)
        with Locations(Location((0, -26, 0), (0, 0, 180))):
            Circle(SCHIZZO3_4_R_2, mode=Mode.SUBTRACT)
    # profile 3 of 4: a face of its own
    with BuildSketch(Plane.XY.offset(2.5)):
        with Locations((26, 0)):
            Circle(SCHIZZO3_4_R)
        with Locations((26, 0)):
            Circle(SCHIZZO3_4_R_2, mode=Mode.SUBTRACT)
    # profile 4 of 4: a face of its own
    with BuildSketch(Plane.XY.offset(2.5)):
        with Locations((0, 26)):
            Circle(SCHIZZO3_4_R)
        with Locations(Location((0, 26, 0), (0, 0, 180))):
            Circle(SCHIZZO3_4_R_2, mode=Mode.SUBTRACT)
    extrude(amount=ESTRUSIONE_ESTRUSIONE5_DEPTH)

    # Schizzo3<5> → Estrusione-Estrusione6 (add)
    # profile 1 of 2: a face of its own
    with BuildSketch(Plane.XY.offset(2.5)):
        with Locations((55, 17.9)):
            Circle(SCHIZZO3_5_R)
        with Locations((55, 17.9)):
            Circle(SCHIZZO3_5_R_2, mode=Mode.SUBTRACT)
    # profile 2 of 2: a face of its own
    with BuildSketch(Plane.XY.offset(2.5)):
        with Locations((101, 17.9)):
            Circle(SCHIZZO3_5_R)
        with Locations((101, 17.9)):
            Circle(SCHIZZO3_5_R_2, mode=Mode.SUBTRACT)
    extrude(amount=ESTRUSIONE_ESTRUSIONE6_DEPTH)

    # Smusso1
    # the kernel refuses this chamfer: 1.5 mm, written as the material it adds along each edge
    with BuildSketch(Plane(origin=(0, 0, 2.5), x_dir=(1, 0, 0), z_dir=(0, -1, 0))) as smusso1_piece_1:
        Polygon((18.6 + SMUSSO1_SIZE, 0), (18.6, SMUSSO1_SIZE), (18.6, 0), align=None)
    revolve(axis=Axis((0, 0, 2.5), (0, 0, 1)))
    with BuildSketch(Plane(origin=(-26, 0, 2.5), x_dir=(1, 0, 0), z_dir=(0, -1, 0))) as smusso1_piece_2:
        Polygon((5 + SMUSSO1_SIZE, 0), (5, SMUSSO1_SIZE), (5, 0), align=None)
    revolve(axis=Axis((-26, 0, 2.5), (0, 0, 1)))
    with BuildSketch(Plane(origin=(0, -26, 2.5), x_dir=(1, 0, 0), z_dir=(0, -1, 0))) as smusso1_piece_3:
        Polygon((5 + SMUSSO1_SIZE, 0), (5, SMUSSO1_SIZE), (5, 0), align=None)
    revolve(axis=Axis((0, -26, 2.5), (0, 0, 1)))
    with BuildSketch(Plane(origin=(26, 0, 2.5), x_dir=(1, 0, 0), z_dir=(0, -1, 0))) as smusso1_piece_4:
        Polygon((5 + SMUSSO1_SIZE, 0), (5, SMUSSO1_SIZE), (5, 0), align=None)
    revolve(axis=Axis((26, 0, 2.5), (0, 0, 1)))
    with BuildSketch(Plane(origin=(0, 26, 2.5), x_dir=(1, 0, 0), z_dir=(0, -1, 0))) as smusso1_piece_5:
        Polygon((5 + SMUSSO1_SIZE, 0), (5, SMUSSO1_SIZE), (5, 0), align=None)
    revolve(axis=Axis((0, 26, 2.5), (0, 0, 1)))
    # the kernel refuses this chamfer: 1.5 mm, written as the material it takes off along each edge
    with BuildSketch(Plane(origin=(55, 17.9, 6), x_dir=(1, 0, 0), z_dir=(0, -1, 0))) as smusso1_2_piece_1:
        Polygon((6.3, -SMUSSO1_SIZE), (6.3 - SMUSSO1_SIZE, 0), (6.3, 0), align=None)
    revolve(axis=Axis((55, 17.9, 6), (0, 0, 1)), mode=Mode.SUBTRACT)
    with BuildSketch(Plane(origin=(101, 17.9, 6), x_dir=(1, 0, 0), z_dir=(0, -1, 0))) as smusso1_2_piece_2:
        Polygon((6.3, -SMUSSO1_SIZE), (6.3 - SMUSSO1_SIZE, 0), (6.3, 0), align=None)
    revolve(axis=Axis((101, 17.9, 6), (0, 0, 1)), mode=Mode.SUBTRACT)

    # Foro per Vite M4-1
    with Locations(Plane(origin=(55, 17.9, 0), x_dir=(-1, 0, 0), z_dir=(0, 0, -1))):
        with Locations((0, 0), (-46, 0)):
            Hole(FORO_PER_VITE_M4_1_D / 2, depth=FORO_PER_VITE_M4_1_DEPTH)
            with Locations((0, 0, -(FORO_PER_VITE_M4_1_DEPTH + FORO_PER_VITE_M4_1_TIP / 2))):  # 118° drill point
                Cone(0, FORO_PER_VITE_M4_1_D / 2, FORO_PER_VITE_M4_1_TIP, mode=Mode.SUBTRACT)


solid = part.part
